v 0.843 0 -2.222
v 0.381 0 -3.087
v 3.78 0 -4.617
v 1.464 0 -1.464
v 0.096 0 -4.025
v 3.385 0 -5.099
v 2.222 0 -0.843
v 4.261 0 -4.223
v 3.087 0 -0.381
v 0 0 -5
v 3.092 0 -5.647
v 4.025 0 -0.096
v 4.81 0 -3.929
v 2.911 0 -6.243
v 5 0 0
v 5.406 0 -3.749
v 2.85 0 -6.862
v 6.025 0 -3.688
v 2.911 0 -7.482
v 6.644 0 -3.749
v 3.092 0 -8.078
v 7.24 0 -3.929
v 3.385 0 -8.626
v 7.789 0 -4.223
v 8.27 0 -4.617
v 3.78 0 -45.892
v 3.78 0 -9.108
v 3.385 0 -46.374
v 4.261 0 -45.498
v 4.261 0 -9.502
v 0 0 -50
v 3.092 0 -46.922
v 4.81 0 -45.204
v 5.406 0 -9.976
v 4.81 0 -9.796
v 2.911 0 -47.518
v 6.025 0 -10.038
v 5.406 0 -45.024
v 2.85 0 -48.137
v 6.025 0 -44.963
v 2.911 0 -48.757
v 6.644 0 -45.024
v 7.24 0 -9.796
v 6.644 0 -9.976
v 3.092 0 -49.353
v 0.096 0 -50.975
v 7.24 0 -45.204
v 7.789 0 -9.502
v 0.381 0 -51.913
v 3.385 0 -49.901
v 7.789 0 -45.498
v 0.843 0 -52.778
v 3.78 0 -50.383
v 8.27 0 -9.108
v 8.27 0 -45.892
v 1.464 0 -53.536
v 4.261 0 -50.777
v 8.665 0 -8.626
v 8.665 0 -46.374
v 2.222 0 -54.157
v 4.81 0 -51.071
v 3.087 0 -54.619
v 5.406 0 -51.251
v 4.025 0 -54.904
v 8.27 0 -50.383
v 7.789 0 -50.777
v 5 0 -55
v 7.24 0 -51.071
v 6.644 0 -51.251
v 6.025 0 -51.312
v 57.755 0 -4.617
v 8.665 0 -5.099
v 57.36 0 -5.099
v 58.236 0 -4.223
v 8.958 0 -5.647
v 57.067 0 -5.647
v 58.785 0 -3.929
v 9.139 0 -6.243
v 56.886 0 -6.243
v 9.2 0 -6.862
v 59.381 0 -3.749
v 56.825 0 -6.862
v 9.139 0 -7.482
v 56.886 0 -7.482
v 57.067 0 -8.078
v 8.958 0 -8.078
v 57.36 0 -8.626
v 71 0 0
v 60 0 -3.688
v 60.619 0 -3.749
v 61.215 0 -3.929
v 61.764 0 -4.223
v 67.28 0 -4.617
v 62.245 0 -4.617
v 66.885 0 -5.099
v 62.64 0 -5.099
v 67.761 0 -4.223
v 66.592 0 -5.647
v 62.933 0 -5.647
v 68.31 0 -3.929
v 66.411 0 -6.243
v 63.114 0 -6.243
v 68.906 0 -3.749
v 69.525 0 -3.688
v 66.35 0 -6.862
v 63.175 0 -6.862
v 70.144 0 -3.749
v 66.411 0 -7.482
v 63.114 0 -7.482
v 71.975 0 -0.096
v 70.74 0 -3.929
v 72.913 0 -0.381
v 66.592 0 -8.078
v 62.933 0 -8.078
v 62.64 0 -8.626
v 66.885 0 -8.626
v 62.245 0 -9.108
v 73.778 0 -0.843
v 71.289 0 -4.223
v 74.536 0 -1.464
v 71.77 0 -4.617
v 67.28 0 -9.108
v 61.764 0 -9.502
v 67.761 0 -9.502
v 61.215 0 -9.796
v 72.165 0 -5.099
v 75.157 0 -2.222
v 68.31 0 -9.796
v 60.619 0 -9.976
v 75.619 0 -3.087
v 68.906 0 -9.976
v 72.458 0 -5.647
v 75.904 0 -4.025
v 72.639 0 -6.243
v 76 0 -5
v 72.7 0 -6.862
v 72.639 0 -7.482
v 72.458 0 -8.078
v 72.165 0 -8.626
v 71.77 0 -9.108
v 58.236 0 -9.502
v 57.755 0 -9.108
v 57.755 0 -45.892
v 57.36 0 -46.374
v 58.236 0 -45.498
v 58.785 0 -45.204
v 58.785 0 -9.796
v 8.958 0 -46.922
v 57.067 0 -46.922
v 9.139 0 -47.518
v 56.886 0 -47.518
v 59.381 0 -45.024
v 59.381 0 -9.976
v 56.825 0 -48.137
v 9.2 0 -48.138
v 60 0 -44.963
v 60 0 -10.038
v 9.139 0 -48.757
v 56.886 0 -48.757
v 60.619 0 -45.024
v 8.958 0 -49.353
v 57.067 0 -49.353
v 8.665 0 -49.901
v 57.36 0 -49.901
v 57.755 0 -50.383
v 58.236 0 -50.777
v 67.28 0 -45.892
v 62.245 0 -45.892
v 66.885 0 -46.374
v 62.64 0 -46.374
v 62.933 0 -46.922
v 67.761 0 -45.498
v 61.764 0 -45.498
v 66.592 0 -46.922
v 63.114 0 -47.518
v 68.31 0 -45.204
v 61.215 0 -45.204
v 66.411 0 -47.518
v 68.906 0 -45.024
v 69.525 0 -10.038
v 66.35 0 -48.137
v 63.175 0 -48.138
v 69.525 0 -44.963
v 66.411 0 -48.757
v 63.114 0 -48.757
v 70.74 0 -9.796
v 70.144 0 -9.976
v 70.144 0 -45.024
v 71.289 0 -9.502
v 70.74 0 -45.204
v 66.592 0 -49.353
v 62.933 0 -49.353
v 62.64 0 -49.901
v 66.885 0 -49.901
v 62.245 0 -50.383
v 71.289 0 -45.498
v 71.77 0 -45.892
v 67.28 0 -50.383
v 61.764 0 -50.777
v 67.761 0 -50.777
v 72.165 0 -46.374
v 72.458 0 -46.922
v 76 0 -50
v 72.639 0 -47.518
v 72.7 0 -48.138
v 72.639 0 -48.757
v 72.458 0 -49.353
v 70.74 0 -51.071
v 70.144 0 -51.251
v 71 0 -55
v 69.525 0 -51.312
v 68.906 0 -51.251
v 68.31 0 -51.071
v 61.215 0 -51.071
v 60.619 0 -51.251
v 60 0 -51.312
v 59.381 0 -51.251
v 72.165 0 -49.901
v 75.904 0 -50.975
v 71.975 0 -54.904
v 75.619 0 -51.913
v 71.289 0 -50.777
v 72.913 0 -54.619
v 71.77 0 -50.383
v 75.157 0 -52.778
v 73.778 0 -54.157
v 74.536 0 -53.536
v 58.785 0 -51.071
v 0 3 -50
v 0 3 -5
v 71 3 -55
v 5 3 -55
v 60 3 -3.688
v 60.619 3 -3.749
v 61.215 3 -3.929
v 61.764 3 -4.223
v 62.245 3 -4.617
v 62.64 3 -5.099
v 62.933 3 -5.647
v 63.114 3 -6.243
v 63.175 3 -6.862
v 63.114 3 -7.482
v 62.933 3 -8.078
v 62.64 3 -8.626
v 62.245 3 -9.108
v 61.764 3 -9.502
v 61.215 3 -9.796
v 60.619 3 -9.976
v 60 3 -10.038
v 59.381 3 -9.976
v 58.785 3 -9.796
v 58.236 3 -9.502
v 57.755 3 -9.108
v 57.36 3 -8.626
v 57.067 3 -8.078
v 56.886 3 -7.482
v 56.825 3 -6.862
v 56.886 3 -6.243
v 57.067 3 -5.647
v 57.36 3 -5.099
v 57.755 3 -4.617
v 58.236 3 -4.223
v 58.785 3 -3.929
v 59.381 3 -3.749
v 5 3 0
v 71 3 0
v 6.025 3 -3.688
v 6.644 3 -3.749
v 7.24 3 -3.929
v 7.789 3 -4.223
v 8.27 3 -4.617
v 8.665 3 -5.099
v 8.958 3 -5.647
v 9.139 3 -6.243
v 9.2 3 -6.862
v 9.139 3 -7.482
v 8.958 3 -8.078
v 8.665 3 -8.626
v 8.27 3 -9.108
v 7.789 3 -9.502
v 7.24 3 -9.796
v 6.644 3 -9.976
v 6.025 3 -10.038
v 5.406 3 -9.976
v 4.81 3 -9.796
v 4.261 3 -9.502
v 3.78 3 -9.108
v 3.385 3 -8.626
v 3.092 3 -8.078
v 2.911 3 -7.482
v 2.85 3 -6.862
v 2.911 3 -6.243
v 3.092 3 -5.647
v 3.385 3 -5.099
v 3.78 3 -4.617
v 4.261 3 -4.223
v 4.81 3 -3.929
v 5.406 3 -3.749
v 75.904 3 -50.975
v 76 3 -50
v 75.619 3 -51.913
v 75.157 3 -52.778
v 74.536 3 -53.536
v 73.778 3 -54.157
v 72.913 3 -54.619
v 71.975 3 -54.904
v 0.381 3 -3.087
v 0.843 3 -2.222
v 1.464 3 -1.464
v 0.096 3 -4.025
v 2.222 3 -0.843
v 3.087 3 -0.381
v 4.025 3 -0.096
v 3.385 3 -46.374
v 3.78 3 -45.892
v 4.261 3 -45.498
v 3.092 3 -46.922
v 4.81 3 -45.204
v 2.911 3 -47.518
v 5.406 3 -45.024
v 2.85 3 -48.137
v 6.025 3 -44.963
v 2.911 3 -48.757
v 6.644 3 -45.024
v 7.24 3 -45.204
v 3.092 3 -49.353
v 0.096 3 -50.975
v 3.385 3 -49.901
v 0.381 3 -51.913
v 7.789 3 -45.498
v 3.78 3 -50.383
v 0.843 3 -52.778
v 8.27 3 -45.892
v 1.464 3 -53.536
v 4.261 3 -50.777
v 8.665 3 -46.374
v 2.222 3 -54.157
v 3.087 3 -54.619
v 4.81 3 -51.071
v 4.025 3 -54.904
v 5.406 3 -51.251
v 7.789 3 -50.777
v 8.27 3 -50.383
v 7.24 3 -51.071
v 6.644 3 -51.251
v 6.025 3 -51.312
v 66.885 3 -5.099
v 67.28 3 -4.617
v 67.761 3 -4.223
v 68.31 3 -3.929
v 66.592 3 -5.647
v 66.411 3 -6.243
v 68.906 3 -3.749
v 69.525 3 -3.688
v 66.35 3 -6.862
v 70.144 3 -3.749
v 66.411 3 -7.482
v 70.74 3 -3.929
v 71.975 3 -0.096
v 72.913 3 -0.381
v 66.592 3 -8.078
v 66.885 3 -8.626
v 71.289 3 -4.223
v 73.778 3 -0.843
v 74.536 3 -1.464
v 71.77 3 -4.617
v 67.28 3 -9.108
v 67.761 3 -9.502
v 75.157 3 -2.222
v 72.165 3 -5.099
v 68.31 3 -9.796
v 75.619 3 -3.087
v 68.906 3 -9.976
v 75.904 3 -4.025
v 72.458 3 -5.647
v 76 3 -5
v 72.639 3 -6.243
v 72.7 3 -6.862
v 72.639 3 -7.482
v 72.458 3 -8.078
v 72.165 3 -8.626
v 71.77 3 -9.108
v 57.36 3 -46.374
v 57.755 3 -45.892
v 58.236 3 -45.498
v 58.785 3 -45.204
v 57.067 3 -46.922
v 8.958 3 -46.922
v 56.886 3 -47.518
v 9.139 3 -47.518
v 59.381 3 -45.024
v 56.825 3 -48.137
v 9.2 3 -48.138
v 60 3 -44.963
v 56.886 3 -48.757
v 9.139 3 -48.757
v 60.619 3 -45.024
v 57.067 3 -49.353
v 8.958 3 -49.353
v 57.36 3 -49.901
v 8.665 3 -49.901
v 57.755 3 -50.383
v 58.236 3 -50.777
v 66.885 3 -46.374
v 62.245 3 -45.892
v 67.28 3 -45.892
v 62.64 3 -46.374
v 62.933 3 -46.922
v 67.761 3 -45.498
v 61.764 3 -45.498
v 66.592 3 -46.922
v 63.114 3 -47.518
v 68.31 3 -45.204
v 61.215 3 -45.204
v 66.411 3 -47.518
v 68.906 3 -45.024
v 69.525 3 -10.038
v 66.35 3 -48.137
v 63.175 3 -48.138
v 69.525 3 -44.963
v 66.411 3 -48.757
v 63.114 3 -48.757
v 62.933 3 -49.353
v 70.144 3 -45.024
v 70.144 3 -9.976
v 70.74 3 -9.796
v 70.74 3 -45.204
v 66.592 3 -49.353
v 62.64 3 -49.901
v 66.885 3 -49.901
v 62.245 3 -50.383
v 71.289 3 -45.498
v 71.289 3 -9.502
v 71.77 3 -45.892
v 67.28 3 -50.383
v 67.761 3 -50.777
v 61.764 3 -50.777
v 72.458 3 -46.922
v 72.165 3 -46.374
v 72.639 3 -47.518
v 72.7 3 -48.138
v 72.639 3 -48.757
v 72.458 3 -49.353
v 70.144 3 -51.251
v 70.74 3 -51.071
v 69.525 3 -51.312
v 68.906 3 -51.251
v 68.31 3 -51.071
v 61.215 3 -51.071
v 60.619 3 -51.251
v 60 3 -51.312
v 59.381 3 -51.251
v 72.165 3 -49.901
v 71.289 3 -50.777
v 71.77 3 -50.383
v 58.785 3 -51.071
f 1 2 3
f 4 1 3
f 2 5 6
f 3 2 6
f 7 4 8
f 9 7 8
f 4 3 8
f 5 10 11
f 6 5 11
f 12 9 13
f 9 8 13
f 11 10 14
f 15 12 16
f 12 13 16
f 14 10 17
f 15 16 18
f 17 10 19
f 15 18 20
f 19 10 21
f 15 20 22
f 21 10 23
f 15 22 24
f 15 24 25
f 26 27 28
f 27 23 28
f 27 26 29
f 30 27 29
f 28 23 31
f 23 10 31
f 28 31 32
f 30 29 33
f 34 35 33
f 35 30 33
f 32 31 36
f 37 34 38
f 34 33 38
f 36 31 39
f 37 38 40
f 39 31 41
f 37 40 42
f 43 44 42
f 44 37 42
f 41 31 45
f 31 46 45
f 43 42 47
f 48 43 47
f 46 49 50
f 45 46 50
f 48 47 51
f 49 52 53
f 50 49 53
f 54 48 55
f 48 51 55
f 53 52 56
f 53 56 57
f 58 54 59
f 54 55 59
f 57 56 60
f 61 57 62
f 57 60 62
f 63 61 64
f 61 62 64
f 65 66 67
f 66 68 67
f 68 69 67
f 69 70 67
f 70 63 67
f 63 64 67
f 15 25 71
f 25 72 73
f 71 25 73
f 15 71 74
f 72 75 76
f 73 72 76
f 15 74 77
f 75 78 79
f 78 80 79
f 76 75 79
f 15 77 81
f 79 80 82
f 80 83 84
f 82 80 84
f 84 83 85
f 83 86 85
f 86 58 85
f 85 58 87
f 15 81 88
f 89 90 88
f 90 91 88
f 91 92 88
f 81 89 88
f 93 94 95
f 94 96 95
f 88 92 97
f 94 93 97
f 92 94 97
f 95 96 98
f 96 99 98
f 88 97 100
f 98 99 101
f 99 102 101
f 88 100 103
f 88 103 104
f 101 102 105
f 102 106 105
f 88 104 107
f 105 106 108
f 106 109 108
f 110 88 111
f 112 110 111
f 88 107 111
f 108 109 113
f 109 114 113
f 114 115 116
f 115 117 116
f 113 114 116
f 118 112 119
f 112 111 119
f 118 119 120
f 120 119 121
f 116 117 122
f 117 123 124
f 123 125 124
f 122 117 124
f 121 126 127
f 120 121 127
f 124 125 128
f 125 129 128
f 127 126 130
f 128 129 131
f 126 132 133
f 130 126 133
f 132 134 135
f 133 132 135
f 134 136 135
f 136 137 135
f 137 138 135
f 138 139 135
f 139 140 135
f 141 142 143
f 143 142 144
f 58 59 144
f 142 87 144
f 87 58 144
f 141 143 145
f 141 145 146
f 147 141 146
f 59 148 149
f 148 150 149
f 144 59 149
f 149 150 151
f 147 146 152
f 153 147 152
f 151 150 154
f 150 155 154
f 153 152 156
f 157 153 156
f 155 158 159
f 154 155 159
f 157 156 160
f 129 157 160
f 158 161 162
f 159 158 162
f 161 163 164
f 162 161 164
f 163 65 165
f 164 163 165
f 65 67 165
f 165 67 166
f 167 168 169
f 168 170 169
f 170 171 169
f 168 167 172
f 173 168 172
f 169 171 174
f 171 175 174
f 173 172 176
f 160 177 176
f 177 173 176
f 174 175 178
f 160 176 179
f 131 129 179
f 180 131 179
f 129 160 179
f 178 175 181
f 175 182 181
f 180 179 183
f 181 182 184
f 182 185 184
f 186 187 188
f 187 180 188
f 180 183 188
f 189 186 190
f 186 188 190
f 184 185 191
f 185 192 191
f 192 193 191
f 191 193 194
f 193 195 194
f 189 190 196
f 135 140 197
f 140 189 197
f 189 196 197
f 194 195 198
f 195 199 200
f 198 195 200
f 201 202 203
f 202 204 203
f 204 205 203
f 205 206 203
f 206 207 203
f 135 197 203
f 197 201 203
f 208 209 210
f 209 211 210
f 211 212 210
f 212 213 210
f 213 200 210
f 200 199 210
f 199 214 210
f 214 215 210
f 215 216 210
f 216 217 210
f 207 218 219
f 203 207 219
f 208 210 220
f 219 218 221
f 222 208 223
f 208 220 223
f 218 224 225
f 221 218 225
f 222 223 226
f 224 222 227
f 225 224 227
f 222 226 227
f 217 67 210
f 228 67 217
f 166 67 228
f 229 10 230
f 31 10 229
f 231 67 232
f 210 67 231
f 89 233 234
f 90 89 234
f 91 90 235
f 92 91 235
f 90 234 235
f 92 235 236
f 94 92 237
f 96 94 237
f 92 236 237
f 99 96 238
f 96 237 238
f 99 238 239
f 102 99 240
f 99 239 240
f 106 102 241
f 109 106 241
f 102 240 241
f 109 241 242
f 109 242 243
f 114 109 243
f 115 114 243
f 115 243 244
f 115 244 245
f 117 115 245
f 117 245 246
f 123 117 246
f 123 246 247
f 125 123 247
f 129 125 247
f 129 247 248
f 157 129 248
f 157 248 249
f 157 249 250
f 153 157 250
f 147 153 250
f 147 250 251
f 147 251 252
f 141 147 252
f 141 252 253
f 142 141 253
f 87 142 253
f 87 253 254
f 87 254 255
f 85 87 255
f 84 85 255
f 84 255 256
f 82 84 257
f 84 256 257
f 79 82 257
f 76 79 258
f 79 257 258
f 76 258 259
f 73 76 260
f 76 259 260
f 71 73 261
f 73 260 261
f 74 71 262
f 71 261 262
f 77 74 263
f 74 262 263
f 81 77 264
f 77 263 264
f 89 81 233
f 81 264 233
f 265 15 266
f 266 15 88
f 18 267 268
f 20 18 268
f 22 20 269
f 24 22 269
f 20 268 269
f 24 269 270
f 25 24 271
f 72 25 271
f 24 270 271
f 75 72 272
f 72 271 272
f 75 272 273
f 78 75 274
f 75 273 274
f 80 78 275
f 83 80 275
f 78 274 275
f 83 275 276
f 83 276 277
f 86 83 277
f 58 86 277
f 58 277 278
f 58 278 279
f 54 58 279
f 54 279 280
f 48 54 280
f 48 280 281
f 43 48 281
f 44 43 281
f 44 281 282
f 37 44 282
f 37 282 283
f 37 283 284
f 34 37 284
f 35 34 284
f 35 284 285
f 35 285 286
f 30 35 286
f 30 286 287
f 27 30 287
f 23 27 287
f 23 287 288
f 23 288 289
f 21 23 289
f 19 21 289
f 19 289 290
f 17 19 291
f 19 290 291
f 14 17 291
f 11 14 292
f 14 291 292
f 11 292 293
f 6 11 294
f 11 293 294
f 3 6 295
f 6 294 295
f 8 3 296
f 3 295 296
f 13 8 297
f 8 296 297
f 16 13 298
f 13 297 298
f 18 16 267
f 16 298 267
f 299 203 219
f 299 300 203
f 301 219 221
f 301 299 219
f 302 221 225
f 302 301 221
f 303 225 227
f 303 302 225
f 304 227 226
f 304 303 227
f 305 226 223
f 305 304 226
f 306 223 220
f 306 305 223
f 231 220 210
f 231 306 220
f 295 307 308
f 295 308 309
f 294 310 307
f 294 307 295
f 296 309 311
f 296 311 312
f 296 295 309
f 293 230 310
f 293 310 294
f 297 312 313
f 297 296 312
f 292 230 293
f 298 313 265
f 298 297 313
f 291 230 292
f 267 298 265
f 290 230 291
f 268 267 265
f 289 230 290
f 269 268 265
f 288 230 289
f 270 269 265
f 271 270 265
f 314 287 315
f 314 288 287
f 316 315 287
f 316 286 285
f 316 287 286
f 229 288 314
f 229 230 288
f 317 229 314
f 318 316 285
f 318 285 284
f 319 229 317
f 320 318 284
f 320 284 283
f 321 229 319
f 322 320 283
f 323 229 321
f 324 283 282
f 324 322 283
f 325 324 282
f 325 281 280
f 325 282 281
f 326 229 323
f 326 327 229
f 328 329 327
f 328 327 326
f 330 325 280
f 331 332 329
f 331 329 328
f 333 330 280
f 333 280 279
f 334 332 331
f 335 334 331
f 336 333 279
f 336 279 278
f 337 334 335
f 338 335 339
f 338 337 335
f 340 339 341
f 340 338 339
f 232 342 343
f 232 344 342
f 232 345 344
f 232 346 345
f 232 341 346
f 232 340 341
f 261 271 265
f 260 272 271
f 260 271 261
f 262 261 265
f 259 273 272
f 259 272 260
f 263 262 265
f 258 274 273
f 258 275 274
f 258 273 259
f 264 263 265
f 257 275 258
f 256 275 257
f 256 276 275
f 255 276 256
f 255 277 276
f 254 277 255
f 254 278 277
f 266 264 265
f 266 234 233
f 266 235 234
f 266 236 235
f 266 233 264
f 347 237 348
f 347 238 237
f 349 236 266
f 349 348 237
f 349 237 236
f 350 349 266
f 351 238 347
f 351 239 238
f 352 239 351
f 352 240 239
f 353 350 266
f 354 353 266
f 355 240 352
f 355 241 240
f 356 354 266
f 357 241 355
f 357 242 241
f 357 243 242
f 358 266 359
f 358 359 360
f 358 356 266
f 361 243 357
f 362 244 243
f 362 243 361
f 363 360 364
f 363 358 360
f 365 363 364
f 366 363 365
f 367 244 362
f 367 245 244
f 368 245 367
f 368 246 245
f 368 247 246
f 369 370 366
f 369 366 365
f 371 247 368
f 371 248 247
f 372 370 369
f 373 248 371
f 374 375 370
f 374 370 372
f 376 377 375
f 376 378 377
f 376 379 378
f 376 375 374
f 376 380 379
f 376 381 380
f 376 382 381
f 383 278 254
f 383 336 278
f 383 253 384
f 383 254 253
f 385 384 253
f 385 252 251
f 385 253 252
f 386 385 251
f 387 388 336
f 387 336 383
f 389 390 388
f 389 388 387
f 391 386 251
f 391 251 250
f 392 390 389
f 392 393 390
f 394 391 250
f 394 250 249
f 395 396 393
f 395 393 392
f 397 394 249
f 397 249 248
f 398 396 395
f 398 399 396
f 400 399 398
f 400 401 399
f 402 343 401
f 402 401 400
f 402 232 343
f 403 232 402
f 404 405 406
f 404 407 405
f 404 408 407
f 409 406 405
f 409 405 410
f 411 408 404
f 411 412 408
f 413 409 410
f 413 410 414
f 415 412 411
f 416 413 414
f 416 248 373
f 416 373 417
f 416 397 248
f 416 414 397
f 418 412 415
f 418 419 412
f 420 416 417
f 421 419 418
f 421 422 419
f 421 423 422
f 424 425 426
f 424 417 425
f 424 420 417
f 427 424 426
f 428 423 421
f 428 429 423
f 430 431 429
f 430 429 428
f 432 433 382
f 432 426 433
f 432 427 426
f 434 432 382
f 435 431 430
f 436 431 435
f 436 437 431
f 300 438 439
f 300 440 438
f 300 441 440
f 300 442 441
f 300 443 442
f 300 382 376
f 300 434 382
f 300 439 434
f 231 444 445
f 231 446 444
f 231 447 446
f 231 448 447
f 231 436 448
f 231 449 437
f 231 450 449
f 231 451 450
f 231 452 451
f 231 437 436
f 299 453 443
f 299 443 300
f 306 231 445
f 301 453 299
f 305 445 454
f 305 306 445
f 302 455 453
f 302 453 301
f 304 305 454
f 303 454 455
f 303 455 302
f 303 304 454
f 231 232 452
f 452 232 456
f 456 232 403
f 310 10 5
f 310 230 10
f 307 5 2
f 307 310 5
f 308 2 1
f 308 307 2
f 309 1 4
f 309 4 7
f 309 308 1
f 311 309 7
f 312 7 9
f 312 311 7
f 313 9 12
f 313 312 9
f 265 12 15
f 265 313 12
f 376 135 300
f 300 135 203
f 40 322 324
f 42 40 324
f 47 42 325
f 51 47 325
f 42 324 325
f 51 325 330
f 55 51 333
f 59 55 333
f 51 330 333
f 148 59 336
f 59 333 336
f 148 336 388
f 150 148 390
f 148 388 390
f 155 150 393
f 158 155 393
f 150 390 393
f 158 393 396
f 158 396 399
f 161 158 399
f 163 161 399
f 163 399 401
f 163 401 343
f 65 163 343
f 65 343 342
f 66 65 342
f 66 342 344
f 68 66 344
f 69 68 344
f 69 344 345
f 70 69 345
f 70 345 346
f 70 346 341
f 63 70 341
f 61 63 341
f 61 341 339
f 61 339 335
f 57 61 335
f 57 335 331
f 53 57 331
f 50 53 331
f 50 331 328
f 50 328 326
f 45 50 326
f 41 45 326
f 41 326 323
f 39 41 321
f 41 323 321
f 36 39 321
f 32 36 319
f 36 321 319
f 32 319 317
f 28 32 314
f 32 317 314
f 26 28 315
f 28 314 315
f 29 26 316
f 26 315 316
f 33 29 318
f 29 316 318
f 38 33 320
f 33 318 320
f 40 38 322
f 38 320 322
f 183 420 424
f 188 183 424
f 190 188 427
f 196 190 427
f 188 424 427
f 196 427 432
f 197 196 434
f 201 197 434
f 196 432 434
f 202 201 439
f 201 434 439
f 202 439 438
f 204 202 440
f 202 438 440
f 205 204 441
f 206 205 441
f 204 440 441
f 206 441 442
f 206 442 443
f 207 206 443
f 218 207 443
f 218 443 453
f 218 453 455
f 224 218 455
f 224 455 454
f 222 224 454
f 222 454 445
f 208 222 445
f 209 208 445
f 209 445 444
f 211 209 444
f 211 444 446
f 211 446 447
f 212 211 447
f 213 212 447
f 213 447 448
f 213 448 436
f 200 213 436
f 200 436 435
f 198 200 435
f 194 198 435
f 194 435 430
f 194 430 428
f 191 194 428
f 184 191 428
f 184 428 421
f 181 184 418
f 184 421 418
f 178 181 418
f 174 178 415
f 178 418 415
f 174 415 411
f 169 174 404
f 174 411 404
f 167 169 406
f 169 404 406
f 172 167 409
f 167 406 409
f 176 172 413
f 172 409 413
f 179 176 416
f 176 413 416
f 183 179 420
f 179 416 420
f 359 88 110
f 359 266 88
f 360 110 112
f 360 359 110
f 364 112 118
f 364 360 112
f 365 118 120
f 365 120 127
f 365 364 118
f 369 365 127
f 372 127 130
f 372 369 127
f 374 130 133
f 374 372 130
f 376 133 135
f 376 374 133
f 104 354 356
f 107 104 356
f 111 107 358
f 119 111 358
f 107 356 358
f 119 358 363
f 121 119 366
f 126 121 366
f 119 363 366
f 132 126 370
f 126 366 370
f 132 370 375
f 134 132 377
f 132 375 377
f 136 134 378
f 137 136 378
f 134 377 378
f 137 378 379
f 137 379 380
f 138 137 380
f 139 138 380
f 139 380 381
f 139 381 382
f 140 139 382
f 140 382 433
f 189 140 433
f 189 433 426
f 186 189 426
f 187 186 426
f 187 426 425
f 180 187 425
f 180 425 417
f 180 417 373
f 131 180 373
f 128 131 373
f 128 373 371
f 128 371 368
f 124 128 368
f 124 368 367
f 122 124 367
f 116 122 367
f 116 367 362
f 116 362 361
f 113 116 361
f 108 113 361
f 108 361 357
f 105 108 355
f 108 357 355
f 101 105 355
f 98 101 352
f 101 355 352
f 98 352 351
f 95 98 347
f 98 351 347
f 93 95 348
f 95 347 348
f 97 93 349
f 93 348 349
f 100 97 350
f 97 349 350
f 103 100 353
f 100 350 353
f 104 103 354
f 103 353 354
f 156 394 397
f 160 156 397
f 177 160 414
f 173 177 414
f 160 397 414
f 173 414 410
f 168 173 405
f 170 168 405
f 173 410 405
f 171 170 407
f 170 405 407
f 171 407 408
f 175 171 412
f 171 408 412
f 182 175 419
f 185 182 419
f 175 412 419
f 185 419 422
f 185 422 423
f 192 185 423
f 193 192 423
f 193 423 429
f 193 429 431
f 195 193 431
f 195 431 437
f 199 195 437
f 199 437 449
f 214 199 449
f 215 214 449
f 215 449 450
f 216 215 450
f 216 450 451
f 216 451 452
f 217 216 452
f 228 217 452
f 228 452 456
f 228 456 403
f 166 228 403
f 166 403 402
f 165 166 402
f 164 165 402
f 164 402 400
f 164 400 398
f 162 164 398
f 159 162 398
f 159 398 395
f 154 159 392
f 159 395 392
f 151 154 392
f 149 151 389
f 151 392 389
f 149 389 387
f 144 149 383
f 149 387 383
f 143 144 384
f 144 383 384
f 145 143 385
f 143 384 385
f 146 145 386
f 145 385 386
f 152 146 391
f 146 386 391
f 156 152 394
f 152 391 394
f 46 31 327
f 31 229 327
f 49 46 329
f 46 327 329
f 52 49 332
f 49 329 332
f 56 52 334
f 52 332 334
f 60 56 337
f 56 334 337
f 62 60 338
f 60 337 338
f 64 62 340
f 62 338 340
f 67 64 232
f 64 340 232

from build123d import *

# Parameters (mm, degrees)
SKETCH1_W           = 76
SKETCH1_H           = 55
BOSS_EXTRUDE1_DEPTH = 3
FILLET2_R           = 5
SKETCH2_R           = 3.175
CUT_EXTRUDE1_DEPTH  = 94.861600242


with BuildPart() as part:
    # Sketch1 → Boss-Extrude1 (new body)
    with BuildSketch(Plane(origin=(0, 0, 0), x_dir=(1, 0, 0), z_dir=(0, 1, 0))):
        with Locations((38, 27.5)):
            Rectangle(SKETCH1_W, SKETCH1_H)
    extrude(amount=BOSS_EXTRUDE1_DEPTH)

    # Fillet2
    fillet2_edges = [part.edges().sort_by_distance(p)[0] for p in [
        (0, 1.5, -55),
        (76, 1.5, -55),
        (76, 1.5, 0),
        (0, 1.5, 0),
    ]]
    fillet(fillet2_edges, radius=FILLET2_R)

    # Sketch2 → Cut-Extrude1 (cut, through all)
    with BuildSketch(Plane(origin=(0, 3, 0), x_dir=(1, 0, 0), z_dir=(0, 1, 0))):
        with Locations(Location((6.025, 48.1375, 0), (0, 0, 270))):
            Circle(SKETCH2_R)
        with Locations(Location((60, 48.1375, 0), (0, 0, 270))):
            Circle(SKETCH2_R)
        with Locations(Location((69.525, 48.1375, 0), (0, 0, 270))):
            Circle(SKETCH2_R)
        with Locations(Location((69.525, 6.8625, 0), (0, 0, 270))):
            Circle(SKETCH2_R)
        with Locations(Location((60, 6.8625, 0), (0, 0, 270))):
            Circle(SKETCH2_R)
        with Locations(Location((6.025, 6.8625, 0), (0, 0, 270))):
            Circle(SKETCH2_R)
    extrude(amount=-CUT_EXTRUDE1_DEPTH, mode=Mode.SUBTRACT)


solid = part.part
